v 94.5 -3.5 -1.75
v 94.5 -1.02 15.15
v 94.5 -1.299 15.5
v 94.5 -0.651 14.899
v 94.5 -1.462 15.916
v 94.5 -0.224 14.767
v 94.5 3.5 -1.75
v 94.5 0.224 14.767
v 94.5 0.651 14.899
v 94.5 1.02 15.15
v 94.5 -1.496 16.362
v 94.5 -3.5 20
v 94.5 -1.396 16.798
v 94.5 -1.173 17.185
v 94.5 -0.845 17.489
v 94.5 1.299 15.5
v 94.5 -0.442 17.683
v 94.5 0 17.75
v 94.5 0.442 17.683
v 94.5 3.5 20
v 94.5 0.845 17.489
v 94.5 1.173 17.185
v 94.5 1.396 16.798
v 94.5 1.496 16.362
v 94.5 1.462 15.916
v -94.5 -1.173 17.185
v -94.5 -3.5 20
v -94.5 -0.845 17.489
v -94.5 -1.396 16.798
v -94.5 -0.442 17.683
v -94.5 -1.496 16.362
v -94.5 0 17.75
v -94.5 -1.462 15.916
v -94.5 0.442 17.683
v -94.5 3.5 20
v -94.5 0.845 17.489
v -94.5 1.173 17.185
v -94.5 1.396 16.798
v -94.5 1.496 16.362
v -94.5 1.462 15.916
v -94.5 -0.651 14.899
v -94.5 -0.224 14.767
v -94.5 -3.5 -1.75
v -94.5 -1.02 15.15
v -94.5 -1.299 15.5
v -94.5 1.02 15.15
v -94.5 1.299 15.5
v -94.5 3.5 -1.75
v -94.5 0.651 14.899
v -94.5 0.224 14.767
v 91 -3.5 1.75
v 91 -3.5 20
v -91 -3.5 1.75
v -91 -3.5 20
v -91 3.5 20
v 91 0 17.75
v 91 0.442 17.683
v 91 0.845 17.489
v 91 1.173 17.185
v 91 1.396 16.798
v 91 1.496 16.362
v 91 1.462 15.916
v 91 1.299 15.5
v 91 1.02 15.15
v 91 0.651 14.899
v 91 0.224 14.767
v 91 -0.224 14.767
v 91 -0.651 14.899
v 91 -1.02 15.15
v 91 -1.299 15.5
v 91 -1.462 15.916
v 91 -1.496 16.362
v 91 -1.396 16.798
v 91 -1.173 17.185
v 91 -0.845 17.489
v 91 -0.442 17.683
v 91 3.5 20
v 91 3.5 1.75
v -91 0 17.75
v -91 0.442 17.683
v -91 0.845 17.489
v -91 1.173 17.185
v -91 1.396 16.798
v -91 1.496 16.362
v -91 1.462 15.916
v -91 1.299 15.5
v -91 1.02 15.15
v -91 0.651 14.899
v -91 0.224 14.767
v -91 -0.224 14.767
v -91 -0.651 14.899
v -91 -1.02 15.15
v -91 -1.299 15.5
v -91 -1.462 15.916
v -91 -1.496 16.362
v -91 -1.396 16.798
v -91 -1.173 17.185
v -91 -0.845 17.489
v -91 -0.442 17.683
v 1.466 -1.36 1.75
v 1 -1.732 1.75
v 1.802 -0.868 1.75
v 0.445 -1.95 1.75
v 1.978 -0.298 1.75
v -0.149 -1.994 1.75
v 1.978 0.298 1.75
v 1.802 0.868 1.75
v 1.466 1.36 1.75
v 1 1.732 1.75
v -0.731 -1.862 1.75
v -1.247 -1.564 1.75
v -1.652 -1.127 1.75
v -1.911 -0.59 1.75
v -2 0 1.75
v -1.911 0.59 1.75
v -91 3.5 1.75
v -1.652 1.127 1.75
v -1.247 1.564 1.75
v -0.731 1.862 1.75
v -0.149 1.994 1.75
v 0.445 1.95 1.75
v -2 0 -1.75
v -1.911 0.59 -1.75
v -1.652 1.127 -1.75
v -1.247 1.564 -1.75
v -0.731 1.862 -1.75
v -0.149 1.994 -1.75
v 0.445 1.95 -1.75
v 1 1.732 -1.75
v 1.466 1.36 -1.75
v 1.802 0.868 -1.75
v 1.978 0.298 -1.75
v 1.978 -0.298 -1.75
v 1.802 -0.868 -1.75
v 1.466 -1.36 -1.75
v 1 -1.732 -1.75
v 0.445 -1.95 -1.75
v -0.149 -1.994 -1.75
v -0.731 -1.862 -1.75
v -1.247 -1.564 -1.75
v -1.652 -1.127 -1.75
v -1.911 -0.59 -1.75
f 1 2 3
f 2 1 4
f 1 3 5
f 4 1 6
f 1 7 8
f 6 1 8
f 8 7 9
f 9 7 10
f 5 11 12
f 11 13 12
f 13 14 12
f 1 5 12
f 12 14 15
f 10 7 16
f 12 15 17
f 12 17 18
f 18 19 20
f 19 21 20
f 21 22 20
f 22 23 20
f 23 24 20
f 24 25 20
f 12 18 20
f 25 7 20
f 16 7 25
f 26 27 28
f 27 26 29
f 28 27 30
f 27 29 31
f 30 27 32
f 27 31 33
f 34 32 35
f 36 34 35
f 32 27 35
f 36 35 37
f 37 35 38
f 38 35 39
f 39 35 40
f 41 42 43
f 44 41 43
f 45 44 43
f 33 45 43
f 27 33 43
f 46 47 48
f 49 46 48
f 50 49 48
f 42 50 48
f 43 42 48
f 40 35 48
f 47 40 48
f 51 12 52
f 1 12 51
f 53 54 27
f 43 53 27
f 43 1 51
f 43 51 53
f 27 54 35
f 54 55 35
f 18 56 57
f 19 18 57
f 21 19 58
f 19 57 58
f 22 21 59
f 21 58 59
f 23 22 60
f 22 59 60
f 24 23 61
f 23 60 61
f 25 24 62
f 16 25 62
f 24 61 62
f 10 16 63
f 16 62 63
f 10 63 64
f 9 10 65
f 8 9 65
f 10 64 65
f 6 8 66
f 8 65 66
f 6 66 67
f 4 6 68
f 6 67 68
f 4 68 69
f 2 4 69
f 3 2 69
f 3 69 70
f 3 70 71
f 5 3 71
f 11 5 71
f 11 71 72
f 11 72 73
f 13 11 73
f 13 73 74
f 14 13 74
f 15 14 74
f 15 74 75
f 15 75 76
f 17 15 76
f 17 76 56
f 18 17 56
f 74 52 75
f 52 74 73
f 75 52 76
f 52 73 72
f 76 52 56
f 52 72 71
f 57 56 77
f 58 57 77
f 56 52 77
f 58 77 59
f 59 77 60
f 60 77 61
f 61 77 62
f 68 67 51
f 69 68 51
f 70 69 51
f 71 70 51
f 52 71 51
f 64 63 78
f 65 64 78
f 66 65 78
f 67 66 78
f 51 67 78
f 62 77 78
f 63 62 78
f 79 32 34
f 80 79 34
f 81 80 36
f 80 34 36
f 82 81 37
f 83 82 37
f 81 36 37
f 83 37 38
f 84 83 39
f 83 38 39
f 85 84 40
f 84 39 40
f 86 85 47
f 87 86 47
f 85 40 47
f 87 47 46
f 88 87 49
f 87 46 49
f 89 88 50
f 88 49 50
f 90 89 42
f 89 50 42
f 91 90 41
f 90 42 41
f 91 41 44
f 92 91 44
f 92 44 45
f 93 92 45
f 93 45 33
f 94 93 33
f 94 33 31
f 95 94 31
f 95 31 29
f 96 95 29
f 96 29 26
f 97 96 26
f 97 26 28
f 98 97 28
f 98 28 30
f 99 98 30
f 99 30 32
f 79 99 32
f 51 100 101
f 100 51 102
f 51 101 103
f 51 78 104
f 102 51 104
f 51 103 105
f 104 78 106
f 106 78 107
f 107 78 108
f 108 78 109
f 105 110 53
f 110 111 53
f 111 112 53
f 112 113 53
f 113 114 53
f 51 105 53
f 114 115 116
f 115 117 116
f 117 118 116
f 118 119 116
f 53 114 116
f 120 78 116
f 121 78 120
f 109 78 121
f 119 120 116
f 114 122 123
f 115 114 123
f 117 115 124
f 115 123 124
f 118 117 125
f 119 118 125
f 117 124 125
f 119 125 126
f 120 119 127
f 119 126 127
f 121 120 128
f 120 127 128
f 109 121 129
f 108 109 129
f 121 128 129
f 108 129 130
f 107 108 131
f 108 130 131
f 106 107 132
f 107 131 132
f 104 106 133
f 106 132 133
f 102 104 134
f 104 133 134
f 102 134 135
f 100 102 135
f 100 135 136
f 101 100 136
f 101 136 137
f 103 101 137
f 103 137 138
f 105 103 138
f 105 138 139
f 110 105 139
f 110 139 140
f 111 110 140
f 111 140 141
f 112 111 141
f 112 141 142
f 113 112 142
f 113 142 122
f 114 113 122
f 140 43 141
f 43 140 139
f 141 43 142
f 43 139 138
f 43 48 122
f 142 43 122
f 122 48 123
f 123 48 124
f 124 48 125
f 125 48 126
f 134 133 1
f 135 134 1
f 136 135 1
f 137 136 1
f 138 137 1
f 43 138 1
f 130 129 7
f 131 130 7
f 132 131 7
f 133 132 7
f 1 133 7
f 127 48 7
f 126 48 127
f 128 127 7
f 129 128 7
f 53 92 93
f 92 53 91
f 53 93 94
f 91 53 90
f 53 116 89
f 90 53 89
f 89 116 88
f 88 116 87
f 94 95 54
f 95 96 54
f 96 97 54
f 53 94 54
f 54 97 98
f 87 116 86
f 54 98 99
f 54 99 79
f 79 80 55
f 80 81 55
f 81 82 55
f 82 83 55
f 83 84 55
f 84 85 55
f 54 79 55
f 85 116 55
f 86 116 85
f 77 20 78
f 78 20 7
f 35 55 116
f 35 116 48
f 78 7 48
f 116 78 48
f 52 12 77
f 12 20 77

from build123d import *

# Parameters (mm, degrees)
BOSS_EXTRUDE1_DEPTH     = 3.5
SKETCH3_R               = 2
CUT_EXTRUDE1_DEPTH      = 7
SKETCH4_R               = 1.5
CUT_EXTRUDE2_DEPTH      = 1
CUT_EXTRUDE2_DEPTH_BACK = 190


with BuildPart() as part:
    # Sketch1 → Boss-Extrude1 (new body, symmetric)
    with BuildSketch(Plane(origin=(0, 0, 0), x_dir=(1, 0, 0), z_dir=(0, 1, 0))):
        Polygon((94.5, 1.75), (94.5, -20), (91, -20), (91, -1.75), (-91, -1.75), (-91, -20), (-94.5, -20), (-94.5, 1.75), align=None)
    extrude(amount=BOSS_EXTRUDE1_DEPTH, both=True)

    # Sketch3 → Cut-Extrude1 (cut)
    with BuildSketch(Plane(origin=(0, 0, -1.75), x_dir=(-1, 0, 0), z_dir=(0, 0, -1))):
        Circle(SKETCH3_R)
    extrude(amount=-CUT_EXTRUDE1_DEPTH, mode=Mode.SUBTRACT)

    # Sketch4 → Cut-Extrude2 (cut, two sides)
    with BuildSketch(Plane.ZY.offset(94.5)) as cut_extrude2_sk:
        with Locations((16.25, 0)):
            Circle(SKETCH4_R)
    extrude(amount=CUT_EXTRUDE2_DEPTH, mode=Mode.SUBTRACT)
    extrude(cut_extrude2_sk.sketch, amount=-CUT_EXTRUDE2_DEPTH_BACK, mode=Mode.SUBTRACT)


solid = part.part
